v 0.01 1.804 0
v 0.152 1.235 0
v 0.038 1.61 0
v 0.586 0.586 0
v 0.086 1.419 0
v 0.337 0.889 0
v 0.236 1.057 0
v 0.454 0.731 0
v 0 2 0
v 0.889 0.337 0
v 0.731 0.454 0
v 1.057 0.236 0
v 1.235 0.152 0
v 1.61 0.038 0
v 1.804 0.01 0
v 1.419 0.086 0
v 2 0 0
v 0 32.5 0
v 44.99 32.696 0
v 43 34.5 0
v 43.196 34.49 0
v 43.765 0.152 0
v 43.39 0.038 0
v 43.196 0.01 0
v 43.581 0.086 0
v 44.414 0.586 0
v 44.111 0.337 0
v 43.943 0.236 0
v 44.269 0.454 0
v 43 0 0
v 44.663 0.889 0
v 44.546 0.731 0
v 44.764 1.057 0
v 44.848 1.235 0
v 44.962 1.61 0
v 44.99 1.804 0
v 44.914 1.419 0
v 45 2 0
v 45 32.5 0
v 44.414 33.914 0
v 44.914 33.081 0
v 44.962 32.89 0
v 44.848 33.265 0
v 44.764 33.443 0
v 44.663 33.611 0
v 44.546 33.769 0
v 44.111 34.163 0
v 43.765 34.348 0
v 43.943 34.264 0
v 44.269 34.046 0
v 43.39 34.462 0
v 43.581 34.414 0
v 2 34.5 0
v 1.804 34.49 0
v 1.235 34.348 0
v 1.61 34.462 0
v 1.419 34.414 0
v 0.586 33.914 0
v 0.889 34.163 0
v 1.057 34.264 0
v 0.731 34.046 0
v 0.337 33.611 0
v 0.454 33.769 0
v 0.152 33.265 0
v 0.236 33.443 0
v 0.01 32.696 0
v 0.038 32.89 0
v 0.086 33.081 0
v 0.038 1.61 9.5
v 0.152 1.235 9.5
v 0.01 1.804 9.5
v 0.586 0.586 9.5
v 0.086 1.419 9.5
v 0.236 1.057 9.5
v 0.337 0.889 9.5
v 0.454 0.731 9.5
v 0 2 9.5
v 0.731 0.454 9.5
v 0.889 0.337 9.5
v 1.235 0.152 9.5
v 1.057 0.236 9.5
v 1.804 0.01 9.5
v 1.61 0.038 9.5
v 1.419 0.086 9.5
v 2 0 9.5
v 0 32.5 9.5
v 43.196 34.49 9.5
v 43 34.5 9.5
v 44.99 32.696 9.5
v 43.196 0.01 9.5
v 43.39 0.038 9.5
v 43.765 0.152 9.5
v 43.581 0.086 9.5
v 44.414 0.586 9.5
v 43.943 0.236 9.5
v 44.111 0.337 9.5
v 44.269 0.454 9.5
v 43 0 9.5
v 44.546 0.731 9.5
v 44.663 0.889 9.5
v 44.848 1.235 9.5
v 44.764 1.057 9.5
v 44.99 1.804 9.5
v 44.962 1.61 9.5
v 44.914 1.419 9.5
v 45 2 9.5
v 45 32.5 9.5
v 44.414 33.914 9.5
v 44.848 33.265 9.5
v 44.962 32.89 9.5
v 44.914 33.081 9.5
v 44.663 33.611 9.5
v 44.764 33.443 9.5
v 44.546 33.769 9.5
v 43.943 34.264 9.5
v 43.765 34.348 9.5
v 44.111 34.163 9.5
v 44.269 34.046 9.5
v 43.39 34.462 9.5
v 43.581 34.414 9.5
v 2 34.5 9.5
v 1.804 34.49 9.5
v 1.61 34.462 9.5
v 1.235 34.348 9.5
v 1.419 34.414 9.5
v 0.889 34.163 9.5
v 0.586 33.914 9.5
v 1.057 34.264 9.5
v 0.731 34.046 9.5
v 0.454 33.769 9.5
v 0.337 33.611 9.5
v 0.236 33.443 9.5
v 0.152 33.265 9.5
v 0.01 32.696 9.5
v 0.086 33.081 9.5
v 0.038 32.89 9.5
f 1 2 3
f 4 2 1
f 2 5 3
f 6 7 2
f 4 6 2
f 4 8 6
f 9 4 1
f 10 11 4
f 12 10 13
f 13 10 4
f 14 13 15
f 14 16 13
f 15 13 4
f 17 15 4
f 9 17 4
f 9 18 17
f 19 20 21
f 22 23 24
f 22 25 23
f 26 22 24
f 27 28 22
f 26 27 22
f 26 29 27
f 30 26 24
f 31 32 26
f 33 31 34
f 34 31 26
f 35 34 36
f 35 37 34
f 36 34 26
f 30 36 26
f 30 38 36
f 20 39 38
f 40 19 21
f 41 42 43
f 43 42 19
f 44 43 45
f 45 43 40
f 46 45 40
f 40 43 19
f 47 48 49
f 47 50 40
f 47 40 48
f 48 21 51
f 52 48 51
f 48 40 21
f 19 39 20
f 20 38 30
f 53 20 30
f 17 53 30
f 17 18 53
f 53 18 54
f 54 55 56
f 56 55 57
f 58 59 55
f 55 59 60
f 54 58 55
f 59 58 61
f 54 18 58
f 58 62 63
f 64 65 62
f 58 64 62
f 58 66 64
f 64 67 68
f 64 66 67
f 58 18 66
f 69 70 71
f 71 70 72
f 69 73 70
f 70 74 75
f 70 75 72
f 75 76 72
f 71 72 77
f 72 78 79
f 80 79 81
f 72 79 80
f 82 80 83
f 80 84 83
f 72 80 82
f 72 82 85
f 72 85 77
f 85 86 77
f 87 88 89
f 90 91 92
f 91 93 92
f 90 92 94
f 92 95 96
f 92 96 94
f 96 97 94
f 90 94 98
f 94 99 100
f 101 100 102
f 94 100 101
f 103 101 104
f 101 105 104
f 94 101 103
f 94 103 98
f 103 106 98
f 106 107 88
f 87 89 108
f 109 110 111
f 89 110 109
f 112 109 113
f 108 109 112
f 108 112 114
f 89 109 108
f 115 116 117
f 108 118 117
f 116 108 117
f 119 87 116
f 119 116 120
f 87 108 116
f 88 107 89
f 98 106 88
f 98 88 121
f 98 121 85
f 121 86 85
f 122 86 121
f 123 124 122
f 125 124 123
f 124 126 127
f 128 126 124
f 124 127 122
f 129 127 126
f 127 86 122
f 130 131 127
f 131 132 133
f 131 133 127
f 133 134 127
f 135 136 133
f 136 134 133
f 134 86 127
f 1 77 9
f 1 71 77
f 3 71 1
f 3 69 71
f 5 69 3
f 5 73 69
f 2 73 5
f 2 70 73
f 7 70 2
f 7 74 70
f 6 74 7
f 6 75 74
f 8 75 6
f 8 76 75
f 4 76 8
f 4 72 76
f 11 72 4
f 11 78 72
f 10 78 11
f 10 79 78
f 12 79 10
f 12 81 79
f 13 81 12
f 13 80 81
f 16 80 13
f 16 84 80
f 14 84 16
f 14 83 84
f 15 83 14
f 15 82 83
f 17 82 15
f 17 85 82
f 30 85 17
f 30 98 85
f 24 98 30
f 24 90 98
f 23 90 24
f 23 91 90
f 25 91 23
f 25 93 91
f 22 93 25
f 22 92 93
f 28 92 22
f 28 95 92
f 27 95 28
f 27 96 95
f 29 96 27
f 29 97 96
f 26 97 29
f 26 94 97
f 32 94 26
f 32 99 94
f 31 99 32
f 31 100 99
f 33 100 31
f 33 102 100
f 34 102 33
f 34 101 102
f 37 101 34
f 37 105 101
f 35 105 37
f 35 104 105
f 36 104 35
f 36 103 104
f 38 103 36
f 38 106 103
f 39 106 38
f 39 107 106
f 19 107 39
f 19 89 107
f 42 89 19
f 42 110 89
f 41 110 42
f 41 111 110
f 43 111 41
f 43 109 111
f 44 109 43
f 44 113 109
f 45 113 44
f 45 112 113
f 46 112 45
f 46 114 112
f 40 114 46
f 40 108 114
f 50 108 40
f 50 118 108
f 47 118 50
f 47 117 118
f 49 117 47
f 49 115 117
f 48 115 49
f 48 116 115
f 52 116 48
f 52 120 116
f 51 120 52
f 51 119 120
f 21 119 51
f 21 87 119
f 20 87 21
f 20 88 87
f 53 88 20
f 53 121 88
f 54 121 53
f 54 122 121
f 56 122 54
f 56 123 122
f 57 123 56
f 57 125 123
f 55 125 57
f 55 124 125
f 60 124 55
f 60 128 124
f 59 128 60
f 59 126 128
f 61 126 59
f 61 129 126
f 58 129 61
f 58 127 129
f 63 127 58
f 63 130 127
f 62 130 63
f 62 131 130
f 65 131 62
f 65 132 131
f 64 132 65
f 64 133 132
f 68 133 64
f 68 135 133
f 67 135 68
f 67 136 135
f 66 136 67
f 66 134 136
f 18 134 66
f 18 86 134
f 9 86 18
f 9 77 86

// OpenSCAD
include <../common.scad>
// External envelope/radius in common.scad.
module breadboard(){color([0.87,0.86,0.82])rounded_box([bread_l,bread_w,bread_h],bread_corner_r);}
breadboard();
